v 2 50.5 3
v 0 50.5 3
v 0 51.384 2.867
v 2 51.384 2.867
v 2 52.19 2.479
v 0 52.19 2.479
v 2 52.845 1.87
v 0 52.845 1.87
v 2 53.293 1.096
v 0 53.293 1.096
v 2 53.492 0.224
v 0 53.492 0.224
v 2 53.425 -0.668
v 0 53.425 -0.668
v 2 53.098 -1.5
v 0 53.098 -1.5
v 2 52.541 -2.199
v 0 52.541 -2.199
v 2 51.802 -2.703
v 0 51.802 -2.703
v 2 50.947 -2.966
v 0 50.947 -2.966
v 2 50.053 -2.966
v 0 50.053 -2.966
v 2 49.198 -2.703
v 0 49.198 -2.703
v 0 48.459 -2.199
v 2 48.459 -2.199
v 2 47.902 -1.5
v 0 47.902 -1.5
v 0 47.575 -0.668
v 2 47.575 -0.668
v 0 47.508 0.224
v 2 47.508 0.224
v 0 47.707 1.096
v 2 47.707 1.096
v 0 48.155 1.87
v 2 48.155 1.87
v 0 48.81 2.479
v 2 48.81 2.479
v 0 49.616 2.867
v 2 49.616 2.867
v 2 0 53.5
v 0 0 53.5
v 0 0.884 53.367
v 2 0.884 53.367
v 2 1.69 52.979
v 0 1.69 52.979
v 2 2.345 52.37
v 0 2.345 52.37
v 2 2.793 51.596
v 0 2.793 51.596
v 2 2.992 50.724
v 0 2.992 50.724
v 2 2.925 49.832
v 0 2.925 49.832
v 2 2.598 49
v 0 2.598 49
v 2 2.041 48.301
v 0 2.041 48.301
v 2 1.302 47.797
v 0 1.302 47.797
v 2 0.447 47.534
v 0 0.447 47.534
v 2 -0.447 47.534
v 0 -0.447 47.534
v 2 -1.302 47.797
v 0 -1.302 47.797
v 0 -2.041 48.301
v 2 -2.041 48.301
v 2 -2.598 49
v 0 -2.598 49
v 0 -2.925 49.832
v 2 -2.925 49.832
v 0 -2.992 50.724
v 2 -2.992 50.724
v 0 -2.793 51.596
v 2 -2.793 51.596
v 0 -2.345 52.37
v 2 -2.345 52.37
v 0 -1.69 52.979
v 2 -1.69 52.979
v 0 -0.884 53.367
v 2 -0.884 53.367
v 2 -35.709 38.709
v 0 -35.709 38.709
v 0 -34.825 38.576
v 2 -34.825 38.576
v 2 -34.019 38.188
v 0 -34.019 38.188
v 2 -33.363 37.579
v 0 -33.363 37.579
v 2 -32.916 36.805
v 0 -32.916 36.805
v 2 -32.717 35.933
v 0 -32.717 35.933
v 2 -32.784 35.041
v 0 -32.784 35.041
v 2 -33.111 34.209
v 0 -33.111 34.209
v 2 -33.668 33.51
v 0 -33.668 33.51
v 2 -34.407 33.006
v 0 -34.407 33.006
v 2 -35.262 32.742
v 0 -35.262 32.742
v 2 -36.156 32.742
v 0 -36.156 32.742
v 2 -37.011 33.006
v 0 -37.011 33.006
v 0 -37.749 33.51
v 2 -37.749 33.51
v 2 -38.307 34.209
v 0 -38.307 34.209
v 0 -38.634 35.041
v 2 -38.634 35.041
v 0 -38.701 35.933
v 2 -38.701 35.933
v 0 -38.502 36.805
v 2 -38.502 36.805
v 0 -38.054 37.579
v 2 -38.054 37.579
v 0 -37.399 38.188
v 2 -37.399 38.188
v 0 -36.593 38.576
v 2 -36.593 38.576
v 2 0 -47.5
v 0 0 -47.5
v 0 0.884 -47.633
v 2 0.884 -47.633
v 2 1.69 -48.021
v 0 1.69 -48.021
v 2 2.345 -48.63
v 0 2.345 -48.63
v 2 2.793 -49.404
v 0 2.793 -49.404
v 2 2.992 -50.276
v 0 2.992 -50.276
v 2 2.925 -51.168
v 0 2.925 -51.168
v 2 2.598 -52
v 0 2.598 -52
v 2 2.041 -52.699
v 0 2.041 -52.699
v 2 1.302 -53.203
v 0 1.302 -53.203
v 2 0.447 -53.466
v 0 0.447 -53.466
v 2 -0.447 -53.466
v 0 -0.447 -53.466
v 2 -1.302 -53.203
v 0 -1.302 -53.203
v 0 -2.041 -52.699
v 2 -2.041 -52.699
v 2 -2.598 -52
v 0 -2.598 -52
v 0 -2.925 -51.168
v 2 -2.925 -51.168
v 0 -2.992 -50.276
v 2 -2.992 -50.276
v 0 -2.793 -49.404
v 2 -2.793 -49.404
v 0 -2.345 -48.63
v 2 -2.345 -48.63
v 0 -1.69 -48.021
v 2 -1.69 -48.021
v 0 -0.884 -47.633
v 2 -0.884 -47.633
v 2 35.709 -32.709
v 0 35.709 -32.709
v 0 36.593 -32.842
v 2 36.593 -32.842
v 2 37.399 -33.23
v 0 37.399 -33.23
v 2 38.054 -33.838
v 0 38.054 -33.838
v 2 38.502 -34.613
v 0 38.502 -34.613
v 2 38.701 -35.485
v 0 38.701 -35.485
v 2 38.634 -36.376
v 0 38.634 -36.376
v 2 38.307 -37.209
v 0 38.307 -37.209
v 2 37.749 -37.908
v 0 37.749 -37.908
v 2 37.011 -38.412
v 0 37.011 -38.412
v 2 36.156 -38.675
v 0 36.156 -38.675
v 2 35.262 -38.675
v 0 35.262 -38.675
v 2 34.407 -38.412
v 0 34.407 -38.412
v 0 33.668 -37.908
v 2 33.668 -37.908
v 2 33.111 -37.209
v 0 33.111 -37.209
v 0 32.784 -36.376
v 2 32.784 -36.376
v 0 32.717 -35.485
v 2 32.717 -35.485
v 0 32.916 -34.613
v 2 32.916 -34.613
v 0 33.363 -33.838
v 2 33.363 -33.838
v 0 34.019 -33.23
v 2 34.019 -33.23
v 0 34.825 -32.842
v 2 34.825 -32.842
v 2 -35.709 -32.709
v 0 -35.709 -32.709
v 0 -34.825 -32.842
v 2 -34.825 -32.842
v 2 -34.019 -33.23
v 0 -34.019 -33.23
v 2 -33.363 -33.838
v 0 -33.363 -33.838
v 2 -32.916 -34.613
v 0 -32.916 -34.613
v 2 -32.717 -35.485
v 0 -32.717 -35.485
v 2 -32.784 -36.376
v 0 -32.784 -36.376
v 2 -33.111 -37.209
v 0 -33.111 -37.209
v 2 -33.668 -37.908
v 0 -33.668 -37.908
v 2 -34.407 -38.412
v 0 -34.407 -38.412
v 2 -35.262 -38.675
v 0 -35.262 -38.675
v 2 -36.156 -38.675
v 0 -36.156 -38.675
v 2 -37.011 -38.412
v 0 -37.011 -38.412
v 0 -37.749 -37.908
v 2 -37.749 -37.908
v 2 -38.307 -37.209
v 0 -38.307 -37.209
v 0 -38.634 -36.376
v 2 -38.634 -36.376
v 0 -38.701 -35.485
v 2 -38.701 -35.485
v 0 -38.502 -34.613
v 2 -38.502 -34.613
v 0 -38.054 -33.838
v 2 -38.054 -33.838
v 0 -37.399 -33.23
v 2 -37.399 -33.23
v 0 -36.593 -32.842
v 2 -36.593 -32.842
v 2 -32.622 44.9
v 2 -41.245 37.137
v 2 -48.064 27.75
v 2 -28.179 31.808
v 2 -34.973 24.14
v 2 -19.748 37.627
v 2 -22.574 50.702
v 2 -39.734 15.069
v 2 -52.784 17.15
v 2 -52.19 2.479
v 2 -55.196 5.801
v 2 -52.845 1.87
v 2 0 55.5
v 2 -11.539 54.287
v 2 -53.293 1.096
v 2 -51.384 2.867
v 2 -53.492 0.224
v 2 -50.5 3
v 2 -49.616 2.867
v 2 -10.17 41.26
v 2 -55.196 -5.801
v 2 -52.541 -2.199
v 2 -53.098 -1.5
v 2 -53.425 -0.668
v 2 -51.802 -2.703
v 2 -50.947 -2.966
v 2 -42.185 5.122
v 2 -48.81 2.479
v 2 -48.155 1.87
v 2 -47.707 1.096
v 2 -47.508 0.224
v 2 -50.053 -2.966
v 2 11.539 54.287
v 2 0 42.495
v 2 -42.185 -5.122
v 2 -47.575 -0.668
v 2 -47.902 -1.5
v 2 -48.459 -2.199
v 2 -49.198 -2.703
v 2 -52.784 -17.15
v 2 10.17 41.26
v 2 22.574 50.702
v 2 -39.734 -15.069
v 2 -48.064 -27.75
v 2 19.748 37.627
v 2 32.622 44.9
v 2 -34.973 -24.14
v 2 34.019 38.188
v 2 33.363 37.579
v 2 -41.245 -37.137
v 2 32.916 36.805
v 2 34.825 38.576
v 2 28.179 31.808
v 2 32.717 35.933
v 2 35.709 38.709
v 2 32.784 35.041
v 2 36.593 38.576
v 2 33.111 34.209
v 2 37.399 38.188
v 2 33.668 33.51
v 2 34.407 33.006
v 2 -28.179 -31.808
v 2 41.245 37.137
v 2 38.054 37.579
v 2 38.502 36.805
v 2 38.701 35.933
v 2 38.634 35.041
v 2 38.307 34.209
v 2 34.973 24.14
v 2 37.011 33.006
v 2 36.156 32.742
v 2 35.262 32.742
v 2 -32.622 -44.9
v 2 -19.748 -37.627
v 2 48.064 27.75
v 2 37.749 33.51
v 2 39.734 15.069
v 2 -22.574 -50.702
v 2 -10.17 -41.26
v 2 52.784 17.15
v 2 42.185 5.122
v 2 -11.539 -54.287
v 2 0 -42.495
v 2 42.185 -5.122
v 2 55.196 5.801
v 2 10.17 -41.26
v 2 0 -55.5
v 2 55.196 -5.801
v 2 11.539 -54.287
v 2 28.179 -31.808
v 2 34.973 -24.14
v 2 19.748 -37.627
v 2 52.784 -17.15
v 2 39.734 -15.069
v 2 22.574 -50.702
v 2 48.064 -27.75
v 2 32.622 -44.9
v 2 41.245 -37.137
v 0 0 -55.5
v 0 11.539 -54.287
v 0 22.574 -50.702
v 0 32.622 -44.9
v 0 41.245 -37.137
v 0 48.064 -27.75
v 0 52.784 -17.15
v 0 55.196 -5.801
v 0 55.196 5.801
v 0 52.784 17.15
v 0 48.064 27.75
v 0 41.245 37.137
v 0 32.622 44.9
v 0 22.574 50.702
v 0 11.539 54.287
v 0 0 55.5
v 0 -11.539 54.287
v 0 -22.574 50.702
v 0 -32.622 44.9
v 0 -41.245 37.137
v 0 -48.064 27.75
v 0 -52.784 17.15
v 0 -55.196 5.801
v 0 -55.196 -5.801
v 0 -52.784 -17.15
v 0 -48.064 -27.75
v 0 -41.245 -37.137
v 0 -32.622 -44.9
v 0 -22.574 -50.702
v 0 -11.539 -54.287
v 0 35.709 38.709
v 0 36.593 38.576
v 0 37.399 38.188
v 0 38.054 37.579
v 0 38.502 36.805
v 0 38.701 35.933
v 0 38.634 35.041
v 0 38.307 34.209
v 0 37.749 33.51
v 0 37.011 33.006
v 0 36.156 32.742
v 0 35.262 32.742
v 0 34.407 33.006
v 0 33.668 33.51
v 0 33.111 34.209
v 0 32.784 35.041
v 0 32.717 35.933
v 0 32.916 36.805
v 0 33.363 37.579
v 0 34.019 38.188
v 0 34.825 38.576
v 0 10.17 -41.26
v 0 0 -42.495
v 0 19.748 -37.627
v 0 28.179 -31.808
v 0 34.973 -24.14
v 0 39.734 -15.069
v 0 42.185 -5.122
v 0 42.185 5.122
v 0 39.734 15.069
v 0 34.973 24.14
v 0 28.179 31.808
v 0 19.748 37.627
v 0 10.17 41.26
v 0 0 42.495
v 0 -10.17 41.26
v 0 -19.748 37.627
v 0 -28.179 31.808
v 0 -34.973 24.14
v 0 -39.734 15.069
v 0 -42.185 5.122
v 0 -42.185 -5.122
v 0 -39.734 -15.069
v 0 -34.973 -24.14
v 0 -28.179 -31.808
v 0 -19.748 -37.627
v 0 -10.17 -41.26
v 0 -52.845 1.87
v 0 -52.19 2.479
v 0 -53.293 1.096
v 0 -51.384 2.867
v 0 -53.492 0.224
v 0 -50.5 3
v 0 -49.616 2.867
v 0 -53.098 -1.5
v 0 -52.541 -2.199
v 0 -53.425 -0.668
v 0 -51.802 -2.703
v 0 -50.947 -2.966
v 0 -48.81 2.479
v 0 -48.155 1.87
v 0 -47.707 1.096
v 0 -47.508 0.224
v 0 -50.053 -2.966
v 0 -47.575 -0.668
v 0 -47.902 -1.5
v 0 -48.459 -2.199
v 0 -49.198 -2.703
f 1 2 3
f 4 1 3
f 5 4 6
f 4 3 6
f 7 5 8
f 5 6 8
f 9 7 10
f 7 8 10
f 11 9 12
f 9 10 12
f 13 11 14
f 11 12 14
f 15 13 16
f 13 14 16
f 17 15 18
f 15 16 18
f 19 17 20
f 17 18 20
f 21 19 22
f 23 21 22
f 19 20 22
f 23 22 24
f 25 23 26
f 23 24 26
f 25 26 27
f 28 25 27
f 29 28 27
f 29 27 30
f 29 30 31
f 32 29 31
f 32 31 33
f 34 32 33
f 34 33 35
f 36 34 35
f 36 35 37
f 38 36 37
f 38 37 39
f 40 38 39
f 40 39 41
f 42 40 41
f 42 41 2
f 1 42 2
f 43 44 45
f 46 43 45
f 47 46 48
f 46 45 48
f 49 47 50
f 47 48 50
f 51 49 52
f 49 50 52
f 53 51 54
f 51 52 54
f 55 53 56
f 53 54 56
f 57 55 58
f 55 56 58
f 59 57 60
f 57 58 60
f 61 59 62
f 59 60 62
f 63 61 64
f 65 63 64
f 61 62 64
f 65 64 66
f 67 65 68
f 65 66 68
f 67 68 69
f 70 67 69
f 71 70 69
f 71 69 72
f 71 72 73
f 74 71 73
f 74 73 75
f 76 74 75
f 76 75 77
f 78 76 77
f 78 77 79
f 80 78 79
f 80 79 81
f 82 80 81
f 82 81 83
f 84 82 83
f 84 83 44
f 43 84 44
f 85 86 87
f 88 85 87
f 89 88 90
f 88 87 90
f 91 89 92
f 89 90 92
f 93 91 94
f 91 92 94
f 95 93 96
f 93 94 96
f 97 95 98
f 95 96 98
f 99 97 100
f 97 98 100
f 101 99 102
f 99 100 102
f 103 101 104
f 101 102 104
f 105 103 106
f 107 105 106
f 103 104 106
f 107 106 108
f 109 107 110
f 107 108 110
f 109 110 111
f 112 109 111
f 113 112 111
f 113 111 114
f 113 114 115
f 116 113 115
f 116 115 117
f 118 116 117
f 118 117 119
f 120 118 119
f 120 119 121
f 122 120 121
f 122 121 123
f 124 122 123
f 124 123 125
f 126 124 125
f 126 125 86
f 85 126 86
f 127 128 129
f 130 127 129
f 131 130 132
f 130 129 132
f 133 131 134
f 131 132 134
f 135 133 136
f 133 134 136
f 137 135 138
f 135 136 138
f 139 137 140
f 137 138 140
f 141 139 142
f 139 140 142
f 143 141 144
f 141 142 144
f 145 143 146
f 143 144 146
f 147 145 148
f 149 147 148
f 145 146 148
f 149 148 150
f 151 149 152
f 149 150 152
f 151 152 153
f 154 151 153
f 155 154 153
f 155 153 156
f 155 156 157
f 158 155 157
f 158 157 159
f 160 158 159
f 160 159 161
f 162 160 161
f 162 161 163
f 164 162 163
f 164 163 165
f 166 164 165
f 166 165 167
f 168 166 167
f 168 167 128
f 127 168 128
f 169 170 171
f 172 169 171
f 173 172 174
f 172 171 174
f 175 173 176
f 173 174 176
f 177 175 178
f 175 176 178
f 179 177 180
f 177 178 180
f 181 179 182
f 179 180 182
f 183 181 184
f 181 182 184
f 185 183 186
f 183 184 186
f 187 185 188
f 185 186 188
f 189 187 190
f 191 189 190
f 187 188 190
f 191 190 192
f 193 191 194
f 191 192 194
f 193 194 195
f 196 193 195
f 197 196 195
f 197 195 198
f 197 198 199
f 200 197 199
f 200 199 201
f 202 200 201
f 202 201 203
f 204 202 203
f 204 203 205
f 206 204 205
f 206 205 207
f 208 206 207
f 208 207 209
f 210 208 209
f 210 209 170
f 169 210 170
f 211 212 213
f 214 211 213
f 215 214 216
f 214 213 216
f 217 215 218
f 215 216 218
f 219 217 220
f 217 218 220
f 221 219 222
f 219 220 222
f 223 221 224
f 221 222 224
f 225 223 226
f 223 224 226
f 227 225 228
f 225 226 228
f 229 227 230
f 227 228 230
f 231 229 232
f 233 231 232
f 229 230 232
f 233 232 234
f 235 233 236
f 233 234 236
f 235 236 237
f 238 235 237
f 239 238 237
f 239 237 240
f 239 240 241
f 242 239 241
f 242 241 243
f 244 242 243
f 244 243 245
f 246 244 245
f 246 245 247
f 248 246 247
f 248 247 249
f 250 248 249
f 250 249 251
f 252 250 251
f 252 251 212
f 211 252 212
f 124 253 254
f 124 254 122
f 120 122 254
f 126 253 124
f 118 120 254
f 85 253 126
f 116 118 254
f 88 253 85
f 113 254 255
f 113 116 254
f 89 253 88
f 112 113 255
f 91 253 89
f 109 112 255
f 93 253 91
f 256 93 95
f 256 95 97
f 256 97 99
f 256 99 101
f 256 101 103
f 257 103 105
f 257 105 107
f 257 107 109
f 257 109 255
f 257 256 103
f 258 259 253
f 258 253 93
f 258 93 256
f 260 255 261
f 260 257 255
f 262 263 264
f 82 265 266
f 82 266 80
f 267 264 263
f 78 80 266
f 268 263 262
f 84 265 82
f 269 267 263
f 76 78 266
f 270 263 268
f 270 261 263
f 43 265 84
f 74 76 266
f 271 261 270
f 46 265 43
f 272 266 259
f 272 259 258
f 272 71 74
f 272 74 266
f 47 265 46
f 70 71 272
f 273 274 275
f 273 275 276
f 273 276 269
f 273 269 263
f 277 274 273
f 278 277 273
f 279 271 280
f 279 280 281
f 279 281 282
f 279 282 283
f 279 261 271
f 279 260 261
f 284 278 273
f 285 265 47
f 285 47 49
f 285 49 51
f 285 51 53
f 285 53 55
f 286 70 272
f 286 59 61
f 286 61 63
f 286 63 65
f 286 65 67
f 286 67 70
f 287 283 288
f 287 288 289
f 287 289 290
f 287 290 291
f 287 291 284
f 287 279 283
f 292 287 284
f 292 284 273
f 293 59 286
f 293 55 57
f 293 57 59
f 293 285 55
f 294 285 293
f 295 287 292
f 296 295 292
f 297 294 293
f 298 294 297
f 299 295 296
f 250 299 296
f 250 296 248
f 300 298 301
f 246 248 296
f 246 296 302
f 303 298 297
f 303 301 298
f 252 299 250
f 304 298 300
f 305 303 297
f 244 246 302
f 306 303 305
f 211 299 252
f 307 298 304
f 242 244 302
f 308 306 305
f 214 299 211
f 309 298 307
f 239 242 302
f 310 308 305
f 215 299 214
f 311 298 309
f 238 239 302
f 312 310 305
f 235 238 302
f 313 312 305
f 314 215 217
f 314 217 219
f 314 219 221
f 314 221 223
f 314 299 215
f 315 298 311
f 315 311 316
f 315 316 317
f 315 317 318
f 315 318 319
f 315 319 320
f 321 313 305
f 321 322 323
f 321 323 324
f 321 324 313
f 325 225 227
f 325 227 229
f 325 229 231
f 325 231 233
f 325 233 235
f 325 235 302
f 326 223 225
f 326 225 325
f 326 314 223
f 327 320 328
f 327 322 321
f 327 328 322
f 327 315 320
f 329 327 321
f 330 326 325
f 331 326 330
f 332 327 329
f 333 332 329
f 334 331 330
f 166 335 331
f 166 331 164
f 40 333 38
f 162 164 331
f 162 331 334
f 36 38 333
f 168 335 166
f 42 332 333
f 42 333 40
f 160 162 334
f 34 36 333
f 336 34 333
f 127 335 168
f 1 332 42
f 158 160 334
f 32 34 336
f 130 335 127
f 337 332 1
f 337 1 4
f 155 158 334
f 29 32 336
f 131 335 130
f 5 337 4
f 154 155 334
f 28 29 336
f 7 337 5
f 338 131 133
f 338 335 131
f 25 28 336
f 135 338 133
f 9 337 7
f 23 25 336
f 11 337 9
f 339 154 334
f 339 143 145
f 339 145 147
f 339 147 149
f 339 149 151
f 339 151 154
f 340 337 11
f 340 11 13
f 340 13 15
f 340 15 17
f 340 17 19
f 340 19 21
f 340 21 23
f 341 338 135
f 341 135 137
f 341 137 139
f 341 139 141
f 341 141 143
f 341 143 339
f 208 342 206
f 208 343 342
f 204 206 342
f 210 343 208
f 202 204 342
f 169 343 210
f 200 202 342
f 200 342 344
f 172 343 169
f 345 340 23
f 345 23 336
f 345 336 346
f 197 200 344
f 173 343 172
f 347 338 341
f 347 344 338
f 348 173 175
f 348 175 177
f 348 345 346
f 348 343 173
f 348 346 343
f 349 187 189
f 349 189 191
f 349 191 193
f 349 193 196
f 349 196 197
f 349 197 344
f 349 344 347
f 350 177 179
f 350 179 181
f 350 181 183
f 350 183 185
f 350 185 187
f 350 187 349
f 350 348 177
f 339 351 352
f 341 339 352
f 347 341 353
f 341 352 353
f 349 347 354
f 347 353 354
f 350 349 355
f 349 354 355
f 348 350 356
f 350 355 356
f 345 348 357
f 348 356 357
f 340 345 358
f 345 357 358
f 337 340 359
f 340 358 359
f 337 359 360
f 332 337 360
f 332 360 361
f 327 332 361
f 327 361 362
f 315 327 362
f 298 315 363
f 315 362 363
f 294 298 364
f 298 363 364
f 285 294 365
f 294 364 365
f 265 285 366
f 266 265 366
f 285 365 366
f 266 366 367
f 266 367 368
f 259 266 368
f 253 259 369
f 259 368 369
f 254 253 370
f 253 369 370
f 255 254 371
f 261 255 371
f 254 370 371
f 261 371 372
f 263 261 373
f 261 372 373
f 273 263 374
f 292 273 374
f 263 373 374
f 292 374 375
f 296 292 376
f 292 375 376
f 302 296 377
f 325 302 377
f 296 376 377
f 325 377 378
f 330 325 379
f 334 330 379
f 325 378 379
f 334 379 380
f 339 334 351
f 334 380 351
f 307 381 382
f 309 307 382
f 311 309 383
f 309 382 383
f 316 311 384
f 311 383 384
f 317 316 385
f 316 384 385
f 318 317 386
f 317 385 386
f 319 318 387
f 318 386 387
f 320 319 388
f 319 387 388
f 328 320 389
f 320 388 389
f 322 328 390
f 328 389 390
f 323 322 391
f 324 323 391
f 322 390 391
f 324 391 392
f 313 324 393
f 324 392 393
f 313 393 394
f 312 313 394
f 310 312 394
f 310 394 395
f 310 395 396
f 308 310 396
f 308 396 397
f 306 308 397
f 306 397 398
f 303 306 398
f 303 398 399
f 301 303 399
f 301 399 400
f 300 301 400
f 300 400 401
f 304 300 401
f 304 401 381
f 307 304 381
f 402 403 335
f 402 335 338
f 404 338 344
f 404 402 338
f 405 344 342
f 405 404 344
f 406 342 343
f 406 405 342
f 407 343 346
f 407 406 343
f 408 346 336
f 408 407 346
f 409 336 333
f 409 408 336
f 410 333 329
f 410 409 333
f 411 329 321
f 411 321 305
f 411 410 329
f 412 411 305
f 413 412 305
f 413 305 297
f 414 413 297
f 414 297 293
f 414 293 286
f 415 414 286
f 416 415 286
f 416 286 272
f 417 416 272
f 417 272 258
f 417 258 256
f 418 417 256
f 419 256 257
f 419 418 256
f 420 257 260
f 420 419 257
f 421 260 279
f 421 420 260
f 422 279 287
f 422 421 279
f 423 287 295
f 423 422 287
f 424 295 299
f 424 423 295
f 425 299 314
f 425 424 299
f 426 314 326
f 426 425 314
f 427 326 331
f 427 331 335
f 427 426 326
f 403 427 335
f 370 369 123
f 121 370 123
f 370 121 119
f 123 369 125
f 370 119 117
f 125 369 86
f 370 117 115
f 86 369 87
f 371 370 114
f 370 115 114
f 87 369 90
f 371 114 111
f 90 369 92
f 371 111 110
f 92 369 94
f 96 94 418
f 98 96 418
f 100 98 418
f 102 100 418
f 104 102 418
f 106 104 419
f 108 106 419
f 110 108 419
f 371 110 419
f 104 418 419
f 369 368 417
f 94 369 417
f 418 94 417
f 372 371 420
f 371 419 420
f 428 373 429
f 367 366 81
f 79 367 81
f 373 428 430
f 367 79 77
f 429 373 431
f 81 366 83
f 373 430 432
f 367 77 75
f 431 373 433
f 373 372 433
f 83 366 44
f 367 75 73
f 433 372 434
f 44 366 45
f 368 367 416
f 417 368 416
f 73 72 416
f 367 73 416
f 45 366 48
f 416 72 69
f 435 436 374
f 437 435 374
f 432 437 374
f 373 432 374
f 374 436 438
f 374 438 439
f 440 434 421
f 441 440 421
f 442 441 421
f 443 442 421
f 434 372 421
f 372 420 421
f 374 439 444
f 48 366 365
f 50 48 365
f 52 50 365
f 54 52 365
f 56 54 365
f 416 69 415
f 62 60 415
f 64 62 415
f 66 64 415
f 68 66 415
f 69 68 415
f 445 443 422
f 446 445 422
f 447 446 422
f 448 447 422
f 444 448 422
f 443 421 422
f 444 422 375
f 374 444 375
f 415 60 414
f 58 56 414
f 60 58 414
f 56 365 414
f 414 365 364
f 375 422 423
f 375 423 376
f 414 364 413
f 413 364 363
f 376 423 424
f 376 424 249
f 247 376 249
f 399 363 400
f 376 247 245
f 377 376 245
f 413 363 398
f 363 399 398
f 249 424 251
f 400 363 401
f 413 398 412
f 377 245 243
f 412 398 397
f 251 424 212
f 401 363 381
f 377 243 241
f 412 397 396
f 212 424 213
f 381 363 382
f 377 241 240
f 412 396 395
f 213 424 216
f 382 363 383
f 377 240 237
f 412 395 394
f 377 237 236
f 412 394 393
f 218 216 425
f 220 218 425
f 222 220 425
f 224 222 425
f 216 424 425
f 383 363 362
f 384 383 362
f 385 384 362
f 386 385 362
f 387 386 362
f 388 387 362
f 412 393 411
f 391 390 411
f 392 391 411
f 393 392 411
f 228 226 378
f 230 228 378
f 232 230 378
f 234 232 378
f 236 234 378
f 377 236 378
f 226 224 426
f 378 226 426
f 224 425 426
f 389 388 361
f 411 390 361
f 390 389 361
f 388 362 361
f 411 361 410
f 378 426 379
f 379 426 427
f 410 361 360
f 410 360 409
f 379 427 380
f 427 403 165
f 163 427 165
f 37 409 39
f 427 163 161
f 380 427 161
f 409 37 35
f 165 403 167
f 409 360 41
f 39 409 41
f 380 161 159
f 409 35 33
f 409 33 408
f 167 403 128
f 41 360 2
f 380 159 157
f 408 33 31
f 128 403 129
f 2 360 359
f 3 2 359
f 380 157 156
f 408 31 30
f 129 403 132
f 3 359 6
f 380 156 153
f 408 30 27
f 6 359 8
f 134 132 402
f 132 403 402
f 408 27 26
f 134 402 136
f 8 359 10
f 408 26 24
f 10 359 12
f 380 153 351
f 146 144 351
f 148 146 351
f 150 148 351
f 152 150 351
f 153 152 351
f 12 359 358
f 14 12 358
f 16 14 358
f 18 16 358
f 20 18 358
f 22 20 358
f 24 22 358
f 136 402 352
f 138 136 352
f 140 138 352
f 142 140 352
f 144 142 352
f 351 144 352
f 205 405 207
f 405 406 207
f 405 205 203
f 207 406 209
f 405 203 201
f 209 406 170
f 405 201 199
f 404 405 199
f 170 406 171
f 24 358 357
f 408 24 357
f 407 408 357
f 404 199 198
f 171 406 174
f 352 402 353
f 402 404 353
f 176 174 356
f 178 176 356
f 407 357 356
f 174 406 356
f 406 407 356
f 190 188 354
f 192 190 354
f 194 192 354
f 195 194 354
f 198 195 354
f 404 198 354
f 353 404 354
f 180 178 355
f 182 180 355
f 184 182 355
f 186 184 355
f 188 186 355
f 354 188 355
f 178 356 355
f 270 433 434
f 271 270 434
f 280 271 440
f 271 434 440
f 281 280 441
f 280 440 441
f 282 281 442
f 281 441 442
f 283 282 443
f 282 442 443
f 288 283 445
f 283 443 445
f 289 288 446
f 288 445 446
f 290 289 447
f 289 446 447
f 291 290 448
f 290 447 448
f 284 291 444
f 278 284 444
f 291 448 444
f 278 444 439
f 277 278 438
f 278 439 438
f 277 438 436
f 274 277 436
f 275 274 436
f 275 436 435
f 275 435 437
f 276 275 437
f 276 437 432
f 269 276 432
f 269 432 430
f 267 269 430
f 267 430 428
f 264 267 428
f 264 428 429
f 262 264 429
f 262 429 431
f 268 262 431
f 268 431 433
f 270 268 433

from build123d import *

# Parameters (mm, degrees)
SKETCH1_R           = 55.5
SKETCH1_R_2         = 42.495
BOSS_EXTRUDE1_DEPTH = 2
SKETCH2_R           = 3
CUT_EXTRUDE1_DEPTH  = 15


with BuildPart() as part:
    # Sketch1 → Boss-Extrude1 (new body)
    with BuildSketch(Plane(origin=(0, 0, 0), x_dir=(0, 0, -1), z_dir=(1, 0, 0))):
        Circle(SKETCH1_R)
        Circle(SKETCH1_R_2, mode=Mode.SUBTRACT)
    extrude(amount=BOSS_EXTRUDE1_DEPTH)

    # Sketch2 → Cut-Extrude1 (cut)
    with BuildSketch(Plane.ZY):
        with Locations((0, 50.5)):
            Circle(SKETCH2_R)
        with Locations((35.70889245, 35.70889245)):
            Circle(SKETCH2_R)
        with Locations((50.5, 0)):
            Circle(SKETCH2_R)
        with Locations((35.70889245, -35.70889245)):
            Circle(SKETCH2_R)
        with Locations((0, -50.5)):
            Circle(SKETCH2_R)
        with Locations((-35.70889245, -35.70889245)):
            Circle(SKETCH2_R)
        with Locations((-50.5, 0)):
            Circle(SKETCH2_R)
        with Locations((-35.70889245, 35.70889245)):
            Circle(SKETCH2_R)
    extrude(amount=-CUT_EXTRUDE1_DEPTH, mode=Mode.SUBTRACT)


solid = part.part
